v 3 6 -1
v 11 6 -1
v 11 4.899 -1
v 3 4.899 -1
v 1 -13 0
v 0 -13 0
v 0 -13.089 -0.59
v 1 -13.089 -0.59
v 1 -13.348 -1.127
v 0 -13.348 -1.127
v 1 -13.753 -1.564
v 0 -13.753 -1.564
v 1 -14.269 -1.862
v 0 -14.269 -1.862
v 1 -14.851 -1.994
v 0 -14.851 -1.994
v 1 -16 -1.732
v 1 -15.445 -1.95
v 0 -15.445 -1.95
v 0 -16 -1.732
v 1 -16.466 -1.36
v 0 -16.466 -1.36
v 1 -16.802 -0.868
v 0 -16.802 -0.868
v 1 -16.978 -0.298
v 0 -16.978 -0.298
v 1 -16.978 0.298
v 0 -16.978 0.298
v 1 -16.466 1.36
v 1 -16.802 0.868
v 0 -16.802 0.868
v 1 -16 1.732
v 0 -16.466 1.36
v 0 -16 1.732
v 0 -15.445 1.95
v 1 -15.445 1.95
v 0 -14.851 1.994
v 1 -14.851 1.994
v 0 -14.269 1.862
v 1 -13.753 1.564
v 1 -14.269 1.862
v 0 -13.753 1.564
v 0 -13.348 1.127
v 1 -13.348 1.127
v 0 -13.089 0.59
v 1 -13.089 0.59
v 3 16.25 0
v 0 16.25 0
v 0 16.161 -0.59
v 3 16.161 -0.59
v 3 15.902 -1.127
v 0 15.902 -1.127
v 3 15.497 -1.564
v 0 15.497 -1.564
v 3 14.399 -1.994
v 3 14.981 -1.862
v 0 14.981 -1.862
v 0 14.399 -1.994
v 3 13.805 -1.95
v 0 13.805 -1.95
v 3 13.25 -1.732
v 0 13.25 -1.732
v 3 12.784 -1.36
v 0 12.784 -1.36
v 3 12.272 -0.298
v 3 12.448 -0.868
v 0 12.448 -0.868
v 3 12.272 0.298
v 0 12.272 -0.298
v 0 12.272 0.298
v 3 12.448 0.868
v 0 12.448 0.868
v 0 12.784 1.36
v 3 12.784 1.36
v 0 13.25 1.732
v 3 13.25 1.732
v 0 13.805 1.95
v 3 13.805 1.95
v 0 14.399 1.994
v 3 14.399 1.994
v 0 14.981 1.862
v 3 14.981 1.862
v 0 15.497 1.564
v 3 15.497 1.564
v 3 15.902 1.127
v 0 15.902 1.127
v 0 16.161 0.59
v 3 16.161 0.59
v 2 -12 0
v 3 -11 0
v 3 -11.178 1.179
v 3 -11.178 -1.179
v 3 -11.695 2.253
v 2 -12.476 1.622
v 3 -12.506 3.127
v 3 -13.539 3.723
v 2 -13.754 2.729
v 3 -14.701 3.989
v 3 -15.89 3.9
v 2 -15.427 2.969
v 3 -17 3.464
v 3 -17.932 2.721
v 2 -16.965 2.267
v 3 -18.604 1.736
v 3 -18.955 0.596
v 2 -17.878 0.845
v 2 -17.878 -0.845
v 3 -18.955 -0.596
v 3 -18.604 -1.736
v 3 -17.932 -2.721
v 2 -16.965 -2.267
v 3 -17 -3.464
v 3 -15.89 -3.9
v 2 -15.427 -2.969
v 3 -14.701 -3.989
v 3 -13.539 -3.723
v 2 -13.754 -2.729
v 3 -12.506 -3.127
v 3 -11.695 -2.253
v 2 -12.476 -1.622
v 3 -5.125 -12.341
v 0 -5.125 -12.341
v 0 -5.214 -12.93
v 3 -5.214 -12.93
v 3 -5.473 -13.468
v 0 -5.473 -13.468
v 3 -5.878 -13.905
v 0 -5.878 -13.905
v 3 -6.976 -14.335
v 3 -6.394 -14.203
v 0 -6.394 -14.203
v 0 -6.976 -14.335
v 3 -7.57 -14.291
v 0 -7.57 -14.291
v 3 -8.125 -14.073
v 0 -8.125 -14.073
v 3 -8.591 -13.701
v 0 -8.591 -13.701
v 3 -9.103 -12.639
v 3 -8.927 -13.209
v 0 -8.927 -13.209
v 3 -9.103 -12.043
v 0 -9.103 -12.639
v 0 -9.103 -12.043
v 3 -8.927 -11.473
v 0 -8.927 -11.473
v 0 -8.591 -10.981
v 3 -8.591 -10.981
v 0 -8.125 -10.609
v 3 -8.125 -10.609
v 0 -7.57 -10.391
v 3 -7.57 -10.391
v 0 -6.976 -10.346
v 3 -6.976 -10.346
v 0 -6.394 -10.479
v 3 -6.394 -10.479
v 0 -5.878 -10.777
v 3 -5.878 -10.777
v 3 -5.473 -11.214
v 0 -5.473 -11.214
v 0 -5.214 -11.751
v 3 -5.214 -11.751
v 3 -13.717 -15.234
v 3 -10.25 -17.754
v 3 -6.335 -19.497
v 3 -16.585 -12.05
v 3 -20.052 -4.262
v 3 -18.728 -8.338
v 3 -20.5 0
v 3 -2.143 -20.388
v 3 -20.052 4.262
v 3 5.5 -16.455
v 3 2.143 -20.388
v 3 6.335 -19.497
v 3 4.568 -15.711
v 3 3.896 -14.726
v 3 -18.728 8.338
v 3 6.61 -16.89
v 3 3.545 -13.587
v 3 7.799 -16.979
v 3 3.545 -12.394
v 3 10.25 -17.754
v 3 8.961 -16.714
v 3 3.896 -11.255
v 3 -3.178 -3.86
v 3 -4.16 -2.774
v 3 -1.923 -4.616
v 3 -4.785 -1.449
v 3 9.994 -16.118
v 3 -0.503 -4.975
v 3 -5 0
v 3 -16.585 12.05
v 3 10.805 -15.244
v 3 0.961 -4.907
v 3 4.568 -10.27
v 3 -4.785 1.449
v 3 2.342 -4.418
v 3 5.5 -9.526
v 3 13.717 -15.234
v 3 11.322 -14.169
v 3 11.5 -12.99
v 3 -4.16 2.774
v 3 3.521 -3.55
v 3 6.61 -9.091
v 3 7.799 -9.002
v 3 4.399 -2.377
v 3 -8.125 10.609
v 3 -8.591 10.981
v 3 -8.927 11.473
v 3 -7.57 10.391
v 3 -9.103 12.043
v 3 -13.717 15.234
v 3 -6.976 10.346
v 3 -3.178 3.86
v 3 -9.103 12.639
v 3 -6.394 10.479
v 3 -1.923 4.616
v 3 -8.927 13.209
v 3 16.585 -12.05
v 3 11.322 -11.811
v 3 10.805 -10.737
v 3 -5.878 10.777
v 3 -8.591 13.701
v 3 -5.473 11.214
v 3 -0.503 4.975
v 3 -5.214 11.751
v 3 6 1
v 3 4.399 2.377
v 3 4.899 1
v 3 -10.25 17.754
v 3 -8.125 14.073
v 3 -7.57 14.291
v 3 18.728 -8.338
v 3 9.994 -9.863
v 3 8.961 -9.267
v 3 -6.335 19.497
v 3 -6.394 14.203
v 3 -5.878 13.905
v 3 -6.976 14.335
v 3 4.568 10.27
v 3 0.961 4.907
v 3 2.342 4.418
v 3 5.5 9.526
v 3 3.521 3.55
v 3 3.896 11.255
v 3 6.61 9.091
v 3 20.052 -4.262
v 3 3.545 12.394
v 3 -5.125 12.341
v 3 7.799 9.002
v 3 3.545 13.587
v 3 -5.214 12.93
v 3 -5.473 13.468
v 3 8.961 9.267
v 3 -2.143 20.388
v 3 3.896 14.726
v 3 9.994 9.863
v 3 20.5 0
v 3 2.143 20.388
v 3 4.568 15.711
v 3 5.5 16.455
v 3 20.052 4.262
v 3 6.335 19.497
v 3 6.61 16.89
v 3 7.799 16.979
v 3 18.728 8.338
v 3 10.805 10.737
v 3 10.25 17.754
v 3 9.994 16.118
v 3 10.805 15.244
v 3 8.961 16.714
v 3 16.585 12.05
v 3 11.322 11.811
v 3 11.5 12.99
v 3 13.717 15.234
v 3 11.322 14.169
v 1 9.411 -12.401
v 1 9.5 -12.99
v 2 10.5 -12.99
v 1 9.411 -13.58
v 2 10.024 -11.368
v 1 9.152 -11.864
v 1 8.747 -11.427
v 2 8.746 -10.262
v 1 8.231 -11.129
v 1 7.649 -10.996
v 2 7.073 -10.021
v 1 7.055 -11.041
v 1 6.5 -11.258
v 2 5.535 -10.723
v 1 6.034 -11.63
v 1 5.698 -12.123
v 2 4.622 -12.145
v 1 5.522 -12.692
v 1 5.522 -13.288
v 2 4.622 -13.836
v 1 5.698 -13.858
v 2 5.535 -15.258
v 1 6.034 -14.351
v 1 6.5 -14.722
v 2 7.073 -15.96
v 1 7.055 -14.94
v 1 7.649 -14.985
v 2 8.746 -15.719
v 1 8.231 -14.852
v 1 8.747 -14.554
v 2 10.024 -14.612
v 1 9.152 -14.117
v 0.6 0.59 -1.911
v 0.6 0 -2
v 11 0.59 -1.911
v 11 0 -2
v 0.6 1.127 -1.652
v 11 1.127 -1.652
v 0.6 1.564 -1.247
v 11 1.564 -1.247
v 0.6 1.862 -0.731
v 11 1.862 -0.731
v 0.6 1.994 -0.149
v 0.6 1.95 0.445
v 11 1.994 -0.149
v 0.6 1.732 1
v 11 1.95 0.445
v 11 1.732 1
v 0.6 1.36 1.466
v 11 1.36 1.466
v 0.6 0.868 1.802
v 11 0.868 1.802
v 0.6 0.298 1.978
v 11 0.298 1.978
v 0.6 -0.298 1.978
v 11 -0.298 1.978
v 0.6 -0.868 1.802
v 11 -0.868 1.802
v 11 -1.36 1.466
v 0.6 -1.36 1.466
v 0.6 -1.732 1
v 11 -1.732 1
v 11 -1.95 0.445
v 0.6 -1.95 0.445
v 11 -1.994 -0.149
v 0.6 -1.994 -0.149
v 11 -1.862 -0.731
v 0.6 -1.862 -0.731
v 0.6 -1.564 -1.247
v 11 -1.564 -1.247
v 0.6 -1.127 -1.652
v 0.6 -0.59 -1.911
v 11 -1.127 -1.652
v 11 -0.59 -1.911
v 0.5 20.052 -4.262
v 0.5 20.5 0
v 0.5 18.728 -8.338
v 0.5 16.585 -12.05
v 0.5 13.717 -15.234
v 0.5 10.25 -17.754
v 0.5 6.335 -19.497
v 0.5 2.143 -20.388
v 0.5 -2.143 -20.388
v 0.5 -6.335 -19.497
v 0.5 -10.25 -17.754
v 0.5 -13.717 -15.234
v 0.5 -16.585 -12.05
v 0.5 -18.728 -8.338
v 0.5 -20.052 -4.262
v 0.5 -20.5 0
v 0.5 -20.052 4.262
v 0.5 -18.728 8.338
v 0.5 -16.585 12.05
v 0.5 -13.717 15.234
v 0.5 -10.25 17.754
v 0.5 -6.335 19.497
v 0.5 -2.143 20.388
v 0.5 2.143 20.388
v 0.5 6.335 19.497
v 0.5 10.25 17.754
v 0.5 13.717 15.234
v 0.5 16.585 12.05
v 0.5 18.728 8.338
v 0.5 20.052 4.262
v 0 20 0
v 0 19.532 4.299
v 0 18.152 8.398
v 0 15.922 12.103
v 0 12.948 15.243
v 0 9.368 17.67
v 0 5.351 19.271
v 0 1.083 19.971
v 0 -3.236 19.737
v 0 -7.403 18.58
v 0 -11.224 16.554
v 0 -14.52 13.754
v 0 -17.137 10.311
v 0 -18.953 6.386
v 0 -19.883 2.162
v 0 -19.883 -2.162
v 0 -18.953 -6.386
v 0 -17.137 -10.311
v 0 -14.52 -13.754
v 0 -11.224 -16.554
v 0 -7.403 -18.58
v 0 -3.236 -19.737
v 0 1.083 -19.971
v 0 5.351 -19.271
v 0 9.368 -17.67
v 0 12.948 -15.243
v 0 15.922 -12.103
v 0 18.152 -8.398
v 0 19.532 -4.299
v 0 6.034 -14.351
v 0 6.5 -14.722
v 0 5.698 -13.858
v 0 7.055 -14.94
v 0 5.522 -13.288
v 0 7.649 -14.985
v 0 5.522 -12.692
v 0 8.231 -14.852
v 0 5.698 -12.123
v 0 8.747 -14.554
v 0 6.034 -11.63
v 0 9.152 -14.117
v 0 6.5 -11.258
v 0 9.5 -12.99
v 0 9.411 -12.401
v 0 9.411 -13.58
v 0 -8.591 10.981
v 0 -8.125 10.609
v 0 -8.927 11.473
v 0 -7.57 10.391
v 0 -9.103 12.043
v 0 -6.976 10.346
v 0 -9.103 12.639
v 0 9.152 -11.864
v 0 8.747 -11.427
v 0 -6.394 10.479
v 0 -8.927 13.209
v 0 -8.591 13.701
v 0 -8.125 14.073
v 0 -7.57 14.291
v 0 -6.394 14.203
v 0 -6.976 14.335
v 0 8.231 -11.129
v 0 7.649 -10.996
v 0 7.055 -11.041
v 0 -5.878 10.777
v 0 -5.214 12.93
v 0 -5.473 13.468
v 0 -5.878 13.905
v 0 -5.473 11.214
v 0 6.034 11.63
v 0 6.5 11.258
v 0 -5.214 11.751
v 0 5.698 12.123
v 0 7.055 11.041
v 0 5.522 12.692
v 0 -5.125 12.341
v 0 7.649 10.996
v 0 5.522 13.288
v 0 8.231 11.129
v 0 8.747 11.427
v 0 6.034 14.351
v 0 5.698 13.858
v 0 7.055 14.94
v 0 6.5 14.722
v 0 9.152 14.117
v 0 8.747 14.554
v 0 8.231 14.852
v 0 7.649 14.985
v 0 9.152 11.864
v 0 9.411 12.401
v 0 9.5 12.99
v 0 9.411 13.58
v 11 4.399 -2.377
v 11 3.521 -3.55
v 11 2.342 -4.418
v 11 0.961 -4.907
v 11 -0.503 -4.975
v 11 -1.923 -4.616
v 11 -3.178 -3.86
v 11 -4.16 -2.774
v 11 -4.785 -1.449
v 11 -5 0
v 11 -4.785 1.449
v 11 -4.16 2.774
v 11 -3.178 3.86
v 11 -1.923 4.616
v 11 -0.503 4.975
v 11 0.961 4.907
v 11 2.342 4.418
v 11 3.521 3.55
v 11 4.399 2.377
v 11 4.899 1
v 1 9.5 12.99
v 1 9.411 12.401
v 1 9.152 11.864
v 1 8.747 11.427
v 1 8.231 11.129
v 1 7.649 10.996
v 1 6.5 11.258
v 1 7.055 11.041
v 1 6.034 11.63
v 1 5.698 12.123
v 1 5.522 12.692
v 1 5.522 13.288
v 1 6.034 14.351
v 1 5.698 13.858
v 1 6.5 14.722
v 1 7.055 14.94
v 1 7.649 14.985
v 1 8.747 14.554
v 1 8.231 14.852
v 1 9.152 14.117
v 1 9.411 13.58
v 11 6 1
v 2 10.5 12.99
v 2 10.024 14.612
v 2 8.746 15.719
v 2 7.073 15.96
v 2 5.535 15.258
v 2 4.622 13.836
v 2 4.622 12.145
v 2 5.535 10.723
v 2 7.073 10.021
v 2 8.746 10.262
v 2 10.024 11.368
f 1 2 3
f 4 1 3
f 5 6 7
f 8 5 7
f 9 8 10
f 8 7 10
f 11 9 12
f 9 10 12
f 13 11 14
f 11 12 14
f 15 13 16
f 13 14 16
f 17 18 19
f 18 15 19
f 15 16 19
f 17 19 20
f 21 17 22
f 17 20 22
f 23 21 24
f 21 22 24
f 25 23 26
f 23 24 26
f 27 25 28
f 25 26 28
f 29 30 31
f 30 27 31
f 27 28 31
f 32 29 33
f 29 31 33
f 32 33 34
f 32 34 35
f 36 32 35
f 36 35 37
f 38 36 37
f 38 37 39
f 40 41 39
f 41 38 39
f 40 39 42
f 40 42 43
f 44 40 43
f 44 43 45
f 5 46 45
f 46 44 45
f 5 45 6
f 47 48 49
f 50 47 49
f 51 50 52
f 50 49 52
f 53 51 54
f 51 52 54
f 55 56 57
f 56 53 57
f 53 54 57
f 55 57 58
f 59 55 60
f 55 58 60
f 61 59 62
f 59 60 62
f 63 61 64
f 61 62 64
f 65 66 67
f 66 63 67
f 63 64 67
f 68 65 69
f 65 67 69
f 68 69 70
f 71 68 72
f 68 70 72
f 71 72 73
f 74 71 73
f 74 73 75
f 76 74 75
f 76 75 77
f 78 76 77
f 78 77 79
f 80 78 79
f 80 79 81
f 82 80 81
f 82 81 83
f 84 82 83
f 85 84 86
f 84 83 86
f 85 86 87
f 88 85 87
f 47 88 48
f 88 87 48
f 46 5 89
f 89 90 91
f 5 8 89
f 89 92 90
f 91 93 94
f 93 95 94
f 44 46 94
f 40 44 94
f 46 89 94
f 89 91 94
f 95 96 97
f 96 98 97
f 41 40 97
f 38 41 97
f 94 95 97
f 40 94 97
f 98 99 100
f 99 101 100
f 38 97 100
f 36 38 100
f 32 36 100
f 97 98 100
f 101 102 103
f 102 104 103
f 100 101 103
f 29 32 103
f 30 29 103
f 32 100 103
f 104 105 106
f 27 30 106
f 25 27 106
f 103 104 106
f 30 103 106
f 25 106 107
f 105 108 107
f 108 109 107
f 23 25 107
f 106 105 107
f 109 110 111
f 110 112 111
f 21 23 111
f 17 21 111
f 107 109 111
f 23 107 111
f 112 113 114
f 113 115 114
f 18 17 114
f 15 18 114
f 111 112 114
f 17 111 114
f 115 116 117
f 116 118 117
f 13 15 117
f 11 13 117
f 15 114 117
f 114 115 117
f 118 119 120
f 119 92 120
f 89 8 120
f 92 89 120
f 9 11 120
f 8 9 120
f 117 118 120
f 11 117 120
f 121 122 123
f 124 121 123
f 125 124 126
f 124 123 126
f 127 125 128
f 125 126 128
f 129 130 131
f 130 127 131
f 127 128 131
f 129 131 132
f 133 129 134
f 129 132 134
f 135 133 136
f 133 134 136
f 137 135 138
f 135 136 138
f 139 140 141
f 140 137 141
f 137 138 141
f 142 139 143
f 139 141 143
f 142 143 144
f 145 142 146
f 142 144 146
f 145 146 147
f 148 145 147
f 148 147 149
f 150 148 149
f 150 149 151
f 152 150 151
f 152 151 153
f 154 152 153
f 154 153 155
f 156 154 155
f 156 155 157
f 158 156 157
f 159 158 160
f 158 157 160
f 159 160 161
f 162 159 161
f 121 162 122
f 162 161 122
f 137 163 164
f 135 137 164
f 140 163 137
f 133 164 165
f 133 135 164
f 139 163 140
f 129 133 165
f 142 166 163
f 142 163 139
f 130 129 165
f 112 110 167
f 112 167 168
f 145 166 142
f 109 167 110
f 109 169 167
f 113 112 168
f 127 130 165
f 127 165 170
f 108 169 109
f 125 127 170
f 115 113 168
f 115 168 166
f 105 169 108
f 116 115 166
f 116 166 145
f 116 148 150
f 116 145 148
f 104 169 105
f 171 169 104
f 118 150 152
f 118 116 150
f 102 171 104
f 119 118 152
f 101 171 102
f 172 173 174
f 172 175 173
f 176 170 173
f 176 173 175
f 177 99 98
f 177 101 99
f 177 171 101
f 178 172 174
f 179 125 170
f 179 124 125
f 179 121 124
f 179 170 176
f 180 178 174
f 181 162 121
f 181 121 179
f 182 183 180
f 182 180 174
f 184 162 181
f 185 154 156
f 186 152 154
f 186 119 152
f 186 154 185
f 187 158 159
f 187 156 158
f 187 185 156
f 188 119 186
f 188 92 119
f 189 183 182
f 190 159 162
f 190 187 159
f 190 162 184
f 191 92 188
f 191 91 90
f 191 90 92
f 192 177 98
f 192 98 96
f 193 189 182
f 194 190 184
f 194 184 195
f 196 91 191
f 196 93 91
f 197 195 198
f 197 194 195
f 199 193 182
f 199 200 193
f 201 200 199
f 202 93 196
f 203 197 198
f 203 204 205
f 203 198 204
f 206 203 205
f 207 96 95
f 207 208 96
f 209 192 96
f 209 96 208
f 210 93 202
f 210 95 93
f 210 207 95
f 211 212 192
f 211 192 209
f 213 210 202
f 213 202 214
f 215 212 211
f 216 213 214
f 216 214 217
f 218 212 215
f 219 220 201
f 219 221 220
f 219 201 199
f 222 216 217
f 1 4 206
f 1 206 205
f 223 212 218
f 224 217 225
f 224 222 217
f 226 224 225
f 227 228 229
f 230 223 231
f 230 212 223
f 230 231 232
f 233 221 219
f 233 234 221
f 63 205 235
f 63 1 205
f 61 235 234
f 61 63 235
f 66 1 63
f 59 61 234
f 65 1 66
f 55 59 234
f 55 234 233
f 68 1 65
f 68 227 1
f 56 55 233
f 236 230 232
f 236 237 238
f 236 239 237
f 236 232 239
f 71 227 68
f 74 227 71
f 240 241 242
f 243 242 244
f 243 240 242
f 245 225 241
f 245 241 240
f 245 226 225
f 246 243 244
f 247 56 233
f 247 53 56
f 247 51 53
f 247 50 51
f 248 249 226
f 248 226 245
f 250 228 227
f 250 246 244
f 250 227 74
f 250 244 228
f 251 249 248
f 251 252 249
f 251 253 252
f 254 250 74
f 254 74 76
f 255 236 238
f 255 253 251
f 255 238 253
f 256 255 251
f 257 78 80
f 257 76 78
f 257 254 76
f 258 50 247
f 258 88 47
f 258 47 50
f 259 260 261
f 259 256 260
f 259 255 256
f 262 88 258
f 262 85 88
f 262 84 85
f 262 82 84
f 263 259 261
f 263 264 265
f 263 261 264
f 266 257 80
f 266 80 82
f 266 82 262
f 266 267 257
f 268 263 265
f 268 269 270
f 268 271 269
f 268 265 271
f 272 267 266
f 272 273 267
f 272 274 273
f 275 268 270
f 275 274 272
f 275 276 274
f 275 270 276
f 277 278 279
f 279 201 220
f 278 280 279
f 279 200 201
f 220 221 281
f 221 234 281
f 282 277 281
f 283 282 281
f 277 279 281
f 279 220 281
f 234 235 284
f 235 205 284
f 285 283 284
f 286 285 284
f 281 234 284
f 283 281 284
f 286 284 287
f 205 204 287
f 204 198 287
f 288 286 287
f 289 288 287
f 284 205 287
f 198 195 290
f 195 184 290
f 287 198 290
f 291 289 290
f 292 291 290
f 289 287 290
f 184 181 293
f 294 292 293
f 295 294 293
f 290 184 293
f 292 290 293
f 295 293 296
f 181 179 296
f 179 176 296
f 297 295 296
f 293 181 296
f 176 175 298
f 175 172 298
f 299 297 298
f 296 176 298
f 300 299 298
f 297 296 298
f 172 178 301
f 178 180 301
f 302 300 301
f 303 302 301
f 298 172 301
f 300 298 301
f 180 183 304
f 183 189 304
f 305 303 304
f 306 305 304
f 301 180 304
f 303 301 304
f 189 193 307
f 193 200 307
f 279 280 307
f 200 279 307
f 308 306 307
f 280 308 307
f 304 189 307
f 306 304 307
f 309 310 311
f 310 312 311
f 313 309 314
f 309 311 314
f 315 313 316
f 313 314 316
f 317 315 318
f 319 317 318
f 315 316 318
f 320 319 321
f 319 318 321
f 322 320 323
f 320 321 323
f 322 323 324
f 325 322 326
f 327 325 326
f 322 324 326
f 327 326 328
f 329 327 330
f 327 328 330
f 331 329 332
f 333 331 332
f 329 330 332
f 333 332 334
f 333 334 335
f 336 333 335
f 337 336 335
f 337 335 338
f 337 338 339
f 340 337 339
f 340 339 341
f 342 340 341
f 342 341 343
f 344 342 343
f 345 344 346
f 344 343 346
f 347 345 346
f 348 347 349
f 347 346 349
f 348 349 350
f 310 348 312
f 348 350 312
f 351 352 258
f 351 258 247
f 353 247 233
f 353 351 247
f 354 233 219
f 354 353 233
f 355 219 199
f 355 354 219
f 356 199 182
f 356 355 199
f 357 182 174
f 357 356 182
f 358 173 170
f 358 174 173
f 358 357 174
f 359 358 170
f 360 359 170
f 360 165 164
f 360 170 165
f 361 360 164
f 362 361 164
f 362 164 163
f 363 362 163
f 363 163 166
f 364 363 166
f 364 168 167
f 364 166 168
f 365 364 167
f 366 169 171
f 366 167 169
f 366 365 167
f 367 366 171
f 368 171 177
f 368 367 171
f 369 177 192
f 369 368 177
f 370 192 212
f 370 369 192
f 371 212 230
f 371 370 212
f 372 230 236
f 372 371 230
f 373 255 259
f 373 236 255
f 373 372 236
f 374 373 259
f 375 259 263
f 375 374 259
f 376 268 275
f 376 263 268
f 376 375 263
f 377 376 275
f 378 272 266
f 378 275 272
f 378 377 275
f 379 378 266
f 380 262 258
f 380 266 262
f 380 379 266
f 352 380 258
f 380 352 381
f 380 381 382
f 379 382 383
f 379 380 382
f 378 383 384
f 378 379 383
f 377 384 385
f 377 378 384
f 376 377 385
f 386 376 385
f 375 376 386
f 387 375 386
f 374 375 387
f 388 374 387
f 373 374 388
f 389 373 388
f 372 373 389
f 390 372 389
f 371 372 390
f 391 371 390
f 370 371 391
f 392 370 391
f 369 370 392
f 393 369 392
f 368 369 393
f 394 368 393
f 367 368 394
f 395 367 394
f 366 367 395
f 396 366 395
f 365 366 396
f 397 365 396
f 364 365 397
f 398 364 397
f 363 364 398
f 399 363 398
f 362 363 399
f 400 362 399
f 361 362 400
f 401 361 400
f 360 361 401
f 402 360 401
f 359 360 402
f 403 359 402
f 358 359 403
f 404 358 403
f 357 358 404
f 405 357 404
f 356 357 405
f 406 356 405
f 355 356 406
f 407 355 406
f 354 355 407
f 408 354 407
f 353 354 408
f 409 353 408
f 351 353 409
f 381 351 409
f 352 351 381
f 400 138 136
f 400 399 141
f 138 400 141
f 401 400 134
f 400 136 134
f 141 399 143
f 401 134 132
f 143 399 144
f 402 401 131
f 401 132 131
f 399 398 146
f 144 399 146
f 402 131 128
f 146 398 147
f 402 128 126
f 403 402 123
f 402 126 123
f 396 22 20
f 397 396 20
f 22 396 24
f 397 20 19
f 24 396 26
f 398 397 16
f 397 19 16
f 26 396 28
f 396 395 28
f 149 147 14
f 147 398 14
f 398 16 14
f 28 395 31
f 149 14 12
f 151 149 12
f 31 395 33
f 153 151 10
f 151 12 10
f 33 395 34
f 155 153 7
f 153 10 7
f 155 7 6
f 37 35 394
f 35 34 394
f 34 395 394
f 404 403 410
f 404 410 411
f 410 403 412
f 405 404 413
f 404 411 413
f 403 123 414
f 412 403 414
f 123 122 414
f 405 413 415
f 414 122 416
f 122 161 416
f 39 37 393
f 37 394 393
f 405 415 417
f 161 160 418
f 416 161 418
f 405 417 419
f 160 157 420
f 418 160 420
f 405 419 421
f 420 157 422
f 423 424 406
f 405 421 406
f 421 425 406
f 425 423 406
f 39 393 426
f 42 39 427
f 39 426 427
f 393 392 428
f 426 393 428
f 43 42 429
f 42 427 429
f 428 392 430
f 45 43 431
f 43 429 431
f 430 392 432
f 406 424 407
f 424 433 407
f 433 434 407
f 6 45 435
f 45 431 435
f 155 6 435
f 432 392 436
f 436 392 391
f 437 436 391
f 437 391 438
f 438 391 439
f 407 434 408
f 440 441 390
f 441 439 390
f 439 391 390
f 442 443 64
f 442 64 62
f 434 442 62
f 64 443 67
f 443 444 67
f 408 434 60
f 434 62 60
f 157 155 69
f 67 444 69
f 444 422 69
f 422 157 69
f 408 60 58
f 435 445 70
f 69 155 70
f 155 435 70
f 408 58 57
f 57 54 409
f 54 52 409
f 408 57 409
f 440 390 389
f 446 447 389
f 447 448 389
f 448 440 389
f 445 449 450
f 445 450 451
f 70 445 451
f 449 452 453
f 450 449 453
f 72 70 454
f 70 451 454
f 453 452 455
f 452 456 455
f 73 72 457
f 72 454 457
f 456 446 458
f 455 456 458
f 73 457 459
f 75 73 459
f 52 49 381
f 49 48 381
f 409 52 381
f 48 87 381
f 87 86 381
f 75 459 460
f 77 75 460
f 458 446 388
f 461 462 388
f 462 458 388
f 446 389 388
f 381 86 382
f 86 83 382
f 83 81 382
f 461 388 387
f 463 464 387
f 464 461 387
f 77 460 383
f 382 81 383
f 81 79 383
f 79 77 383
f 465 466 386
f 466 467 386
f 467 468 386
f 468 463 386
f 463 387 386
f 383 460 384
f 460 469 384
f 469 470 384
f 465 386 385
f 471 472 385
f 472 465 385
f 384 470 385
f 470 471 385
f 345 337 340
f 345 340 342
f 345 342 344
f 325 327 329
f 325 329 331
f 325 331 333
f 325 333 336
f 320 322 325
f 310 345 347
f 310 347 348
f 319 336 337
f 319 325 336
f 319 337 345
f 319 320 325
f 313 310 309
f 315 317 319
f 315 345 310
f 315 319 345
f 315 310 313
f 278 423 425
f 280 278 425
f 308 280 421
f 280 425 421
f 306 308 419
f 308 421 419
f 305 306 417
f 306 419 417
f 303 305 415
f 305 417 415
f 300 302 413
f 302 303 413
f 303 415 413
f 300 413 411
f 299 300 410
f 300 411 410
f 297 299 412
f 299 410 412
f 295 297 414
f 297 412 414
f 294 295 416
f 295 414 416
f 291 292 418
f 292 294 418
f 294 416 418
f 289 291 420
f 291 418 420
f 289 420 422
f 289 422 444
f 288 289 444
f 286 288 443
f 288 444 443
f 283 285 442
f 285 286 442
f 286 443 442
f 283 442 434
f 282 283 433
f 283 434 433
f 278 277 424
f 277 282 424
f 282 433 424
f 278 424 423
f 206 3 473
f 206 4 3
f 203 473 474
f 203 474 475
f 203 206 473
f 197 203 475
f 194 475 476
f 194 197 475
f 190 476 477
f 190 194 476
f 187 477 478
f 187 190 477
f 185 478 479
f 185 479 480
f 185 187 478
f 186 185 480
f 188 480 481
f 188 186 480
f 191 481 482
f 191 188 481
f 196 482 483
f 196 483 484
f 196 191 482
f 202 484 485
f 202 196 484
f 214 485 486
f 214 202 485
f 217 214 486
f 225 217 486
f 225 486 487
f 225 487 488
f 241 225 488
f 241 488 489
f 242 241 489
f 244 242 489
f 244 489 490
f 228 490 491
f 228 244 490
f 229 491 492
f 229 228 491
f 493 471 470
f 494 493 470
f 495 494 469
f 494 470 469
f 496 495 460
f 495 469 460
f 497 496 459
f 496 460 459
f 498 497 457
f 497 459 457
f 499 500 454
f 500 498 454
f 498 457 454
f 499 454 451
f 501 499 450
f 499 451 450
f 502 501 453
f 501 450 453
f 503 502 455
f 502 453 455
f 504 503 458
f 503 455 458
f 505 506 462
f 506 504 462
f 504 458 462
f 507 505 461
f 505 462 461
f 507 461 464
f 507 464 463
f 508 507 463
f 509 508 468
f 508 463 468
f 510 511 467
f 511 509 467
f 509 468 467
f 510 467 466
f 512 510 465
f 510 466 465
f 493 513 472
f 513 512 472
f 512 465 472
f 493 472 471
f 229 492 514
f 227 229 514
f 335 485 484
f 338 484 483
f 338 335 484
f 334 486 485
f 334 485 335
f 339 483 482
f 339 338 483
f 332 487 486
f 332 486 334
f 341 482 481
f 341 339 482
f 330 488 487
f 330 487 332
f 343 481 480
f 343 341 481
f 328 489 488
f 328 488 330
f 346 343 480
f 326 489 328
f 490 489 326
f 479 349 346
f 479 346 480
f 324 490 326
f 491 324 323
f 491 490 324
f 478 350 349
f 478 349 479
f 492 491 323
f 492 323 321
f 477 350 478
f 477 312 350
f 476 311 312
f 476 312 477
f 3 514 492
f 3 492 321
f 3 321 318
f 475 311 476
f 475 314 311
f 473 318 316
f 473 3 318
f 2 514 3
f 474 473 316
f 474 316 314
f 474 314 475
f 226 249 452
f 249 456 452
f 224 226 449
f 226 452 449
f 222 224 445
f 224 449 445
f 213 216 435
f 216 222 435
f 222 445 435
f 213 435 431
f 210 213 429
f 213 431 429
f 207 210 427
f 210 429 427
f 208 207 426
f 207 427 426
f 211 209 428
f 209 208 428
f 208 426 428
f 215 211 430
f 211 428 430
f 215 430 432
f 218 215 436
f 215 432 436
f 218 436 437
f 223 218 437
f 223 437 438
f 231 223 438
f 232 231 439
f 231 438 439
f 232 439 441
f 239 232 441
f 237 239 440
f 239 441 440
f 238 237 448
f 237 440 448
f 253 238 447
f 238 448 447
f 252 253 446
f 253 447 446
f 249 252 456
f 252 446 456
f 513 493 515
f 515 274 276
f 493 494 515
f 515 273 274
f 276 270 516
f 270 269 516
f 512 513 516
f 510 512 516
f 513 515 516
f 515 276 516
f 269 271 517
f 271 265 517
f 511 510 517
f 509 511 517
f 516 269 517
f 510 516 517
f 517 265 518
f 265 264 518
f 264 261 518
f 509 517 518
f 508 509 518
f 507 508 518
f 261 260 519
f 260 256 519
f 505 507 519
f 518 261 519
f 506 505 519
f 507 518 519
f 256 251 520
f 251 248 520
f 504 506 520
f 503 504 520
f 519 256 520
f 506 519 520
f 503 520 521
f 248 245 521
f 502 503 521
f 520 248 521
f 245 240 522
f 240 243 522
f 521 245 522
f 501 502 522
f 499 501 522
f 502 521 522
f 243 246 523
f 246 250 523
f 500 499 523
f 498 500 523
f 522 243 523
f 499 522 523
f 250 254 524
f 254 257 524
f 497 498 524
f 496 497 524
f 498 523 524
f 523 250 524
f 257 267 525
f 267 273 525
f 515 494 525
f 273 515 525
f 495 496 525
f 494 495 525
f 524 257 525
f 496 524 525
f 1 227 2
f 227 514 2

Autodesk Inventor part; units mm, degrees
ref_plane "YZ Plane" through (0, 0, 0) normal (1, 0, 0) x (0, 1, 0)
ref_plane "XZ Plane" through (0, 0, 0) normal (0, 1, 0) x (-1, 0, 0)
ref_plane "XY Plane" through (0, 0, 0) normal (0, 0, 1) x (1, 0, 0)
sketch "Sketch1" plane through (0, 0, 0) normal (1, 0, 0) x (0, 1, 0)
  circle A0 centre (0, 0) radius 20.5
  circle A1 centre (0, 0) radius 15 construction
  line L0 (0, 0) -> (16.0369, -27.7767) construction
  line L1 (16.0369, -27.7767) -> (16.0369, 0) construction
  line L2 (16.0369, 0) -> (0, 0) construction
  circle A2 centre (0, 0) radius 14.25 construction
  line L3 (0, 0) -> (-15.2425, -26.4009) construction
  line L4 (-15.2425, -26.4009) -> (-20.5, 0) construction
  line L5 (0, 0) -> (-20.5, 0) construction
  circle A3 centre (7.5, -12.9904) radius 2
  circle A4 centre (7.5, 12.9904) radius 2
  circle A5 centre (-15, 0) radius 2
  circle A6 centre (14.25, 0) radius 2
  circle A7 centre (-7.125, 12.3409) radius 2
  circle A8 centre (-7.125, -12.3409) radius 2
  dimension "d0" = 41
  dimension "d1" = 30
  dimension "d16" = 28.5
  dimension "d15" = 60
  dimension "d22" = 60
  dimension "d28" = 4
  dimension "d31" = 360
  dimension "d33" = 4
  dimension "d36" = 360
extrude "Extrusion1" add sketch "Sketch1" along normal blind 3
chamfer "Chamfer2" distance 0.5 angle 45 1 edges at (0, -20.5, 0)
chamfer "Chamfer3" distance 2 angle 45 3 edges at (3, 5.5, -12.9904) (3, -17, 0) (3, 5.5, 12.9904)
sketch "Sketch5" plane through (3, 0, 0) normal (1, 0, 0) x (0, 0, -1)
  circle A0 centre (0, 0) radius 5
  dimension "d44" = 10
extrude "Extrusion3" add sketch "Sketch5" along normal blind 8
sketch "Sketch6" plane through (11, 0, 0) normal (1, 0, 0) x (0, 0, -1)
  line L0 (-1, 4) -> (-1, 6)
  line L1 (-1, 6) -> (1, 6)
  line L2 (1, 6) -> (1, 4)
  line L3 (1, 4) -> (-1, 4)
  circle A0 centre (0, 0) radius 5 projected
  line L4 (-1, 4) -> (1, 6) construction
  line L5 (-1, 6) -> (1, 4) construction
  point P0 (0, 5)
  point P1 (-1, 4.899)
  point P2 (1, 4.899)
  dimension "d47" = 2
  dimension "d48" = 2
extrude "Extrusion4" add sketch "Sketch6" against normal blind 8 contours L0 L1 L2 A0
sketch "Sketch7" plane through (11, 0, 0) normal (1, 0, 0) x (0, 0, -1)
  circle A0 centre (0, 0) radius 2
  dimension "d51" = 4
extrude "Extrusion5" cut sketch "Sketch7" against normal blind 10.4
properties part number "small_gear_connector"
